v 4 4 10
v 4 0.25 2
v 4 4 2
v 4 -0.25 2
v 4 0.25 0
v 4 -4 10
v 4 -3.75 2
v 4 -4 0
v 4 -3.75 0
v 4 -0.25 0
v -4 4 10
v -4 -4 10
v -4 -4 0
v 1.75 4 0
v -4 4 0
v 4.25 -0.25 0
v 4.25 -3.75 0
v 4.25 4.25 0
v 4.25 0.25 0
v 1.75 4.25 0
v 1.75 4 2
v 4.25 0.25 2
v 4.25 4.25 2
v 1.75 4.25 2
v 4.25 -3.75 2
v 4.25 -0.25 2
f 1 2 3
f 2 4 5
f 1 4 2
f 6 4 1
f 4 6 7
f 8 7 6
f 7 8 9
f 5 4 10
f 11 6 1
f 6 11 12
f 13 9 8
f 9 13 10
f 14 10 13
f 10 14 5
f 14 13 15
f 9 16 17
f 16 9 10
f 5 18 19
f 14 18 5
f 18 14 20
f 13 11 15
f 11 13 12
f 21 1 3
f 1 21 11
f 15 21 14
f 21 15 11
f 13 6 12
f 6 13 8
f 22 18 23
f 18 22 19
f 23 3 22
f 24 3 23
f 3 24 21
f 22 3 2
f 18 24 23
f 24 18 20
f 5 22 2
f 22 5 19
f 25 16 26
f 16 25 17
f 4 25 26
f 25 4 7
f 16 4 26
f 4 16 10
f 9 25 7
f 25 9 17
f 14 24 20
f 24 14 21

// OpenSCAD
translate([0, 0, 5]) color([0,1,0,0.9]) cube([8, 8, 10], center=true);
translate([4.0, 4.0, 1]) color([1,0,0]) cube([0.5, 0.5, 2], center=true);
translate([4.0, 3.5, 1]) color([1,0,0]) cube([0.5, 0.5, 2], center=true);
translate([4.0, 3.0, 1]) color([1,0,0]) cube([0.5, 0.5, 2], center=true);
translate([4.0, 2.5, 1]) color([1,0,0]) cube([0.5, 0.5, 2], center=true);
translate([4.0, 2.0, 1]) color([1,0,0]) cube([0.5, 0.5, 2], center=true);
translate([4.0, 1.5, 1]) color([1,0,0]) cube([0.5, 0.5, 2], center=true);
translate([4.0, 1.0, 1]) color([1,0,0]) cube([0.5, 0.5, 2], center=true);
translate([4.0, 0.5, 1]) color([1,0,0]) cube([0.5, 0.5, 2], center=true);
translate([4.0, -0.5, 1]) color([1,0,0]) cube([0.5, 0.5, 2], center=true);
translate([4.0, -1.0, 1]) color([1,0,0]) cube([0.5, 0.5, 2], center=true);
translate([4.0, -1.5, 1]) color([1,0,0]) cube([0.5, 0.5, 2], center=true);
translate([4.0, -2.0, 1]) color([1,0,0]) cube([0.5, 0.5, 2], center=true);
translate([4.0, -2.5, 1]) color([1,0,0]) cube([0.5, 0.5, 2], center=true);
translate([4.0, -3.0, 1]) color([1,0,0]) cube([0.5, 0.5, 2], center=true);
translate([4.0, -3.5, 1]) color([1,0,0]) cube([0.5, 0.5, 2], center=true);
translate([3.5, 4.0, 1]) color([1,0,0]) cube([0.5, 0.5, 2], center=true);
translate([3.5, 3.5, 1]) color([1,0,0]) cube([0.5, 0.5, 2], center=true);
translate([3.5, 3.0, 1]) color([1,0,0]) cube([0.5, 0.5, 2], center=true);
translate([3.5, 2.5, 1]) color([1,0,0]) cube([0.5, 0.5, 2], center=true);
translate([3.5, 2.0, 1]) color([1,0,0]) cube([0.5, 0.5, 2], center=true);
translate([3.5, 1.5, 1]) color([1,0,0]) cube([0.5, 0.5, 2], center=true);
translate([3.5, 1.0, 1]) color([1,0,0]) cube([0.5, 0.5, 2], center=true);
translate([3.5, 0.5, 1]) color([1,0,0]) cube([0.5, 0.5, 2], center=true);
translate([3.5, -0.5, 1]) color([1,0,0]) cube([0.5, 0.5, 2], center=true);
translate([3.5, -1.0, 1]) color([1,0,0]) cube([0.5, 0.5, 2], center=true);
translate([3.5, -1.5, 1]) color([1,0,0]) cube([0.5, 0.5, 2], center=true);
translate([3.5, -2.0, 1]) color([1,0,0]) cube([0.5, 0.5, 2], center=true);
translate([3.5, -2.5, 1]) color([1,0,0]) cube([0.5, 0.5, 2], center=true);
translate([3.5, -3.0, 1]) color([1,0,0]) cube([0.5, 0.5, 2], center=true);
translate([3.5, -3.5, 1]) color([1,0,0]) cube([0.5, 0.5, 2], center=true);
translate([3.0, 4.0, 1]) color([1,0,0]) cube([0.5, 0.5, 2], center=true);
translate([3.0, 3.5, 1]) color([1,0,0]) cube([0.5, 0.5, 2], center=true);
translate([3.0, 3.0, 1]) color([1,0,0]) cube([0.5, 0.5, 2], center=true);
translate([3.0, 2.5, 1]) color([1,0,0]) cube([0.5, 0.5, 2], center=true);
translate([3.0, 2.0, 1]) color([1,0,0]) cube([0.5, 0.5, 2], center=true);
translate([3.0, 1.5, 1]) color([1,0,0]) cube([0.5, 0.5, 2], center=true);
translate([3.0, 1.0, 1]) color([1,0,0]) cube([0.5, 0.5, 2], center=true);
translate([3.0, 0.5, 1]) color([1,0,0]) cube([0.5, 0.5, 2], center=true);
translate([3.0, -0.5, 1]) color([1,0,0]) cube([0.5, 0.5, 2], center=true);
translate([3.0, -1.0, 1]) color([1,0,0]) cube([0.5, 0.5, 2], center=true);
translate([3.0, -1.5, 1]) color([1,0,0]) cube([0.5, 0.5, 2], center=true);
translate([3.0, -2.0, 1]) color([1,0,0]) cube([0.5, 0.5, 2], center=true);
translate([3.0, -2.5, 1]) color([1,0,0]) cube([0.5, 0.5, 2], center=true);
translate([3.0, -3.0, 1]) color([1,0,0]) cube([0.5, 0.5, 2], center=true);
translate([3.0, -3.5, 1]) color([1,0,0]) cube([0.5, 0.5, 2], center=true);
translate([2.5, 4.0, 1]) color([1,0,0]) cube([0.5, 0.5, 2], center=true);
translate([2.5, 3.5, 1]) color([1,0,0]) cube([0.5, 0.5, 2], center=true);
translate([2.5, 3.0, 1]) color([1,0,0]) cube([0.5, 0.5, 2], center=true);
translate([2.5, 2.5, 1]) color([1,0,0]) cube([0.5, 0.5, 2], center=true);
translate([2.5, 2.0, 1]) color([1,0,0]) cube([0.5, 0.5, 2], center=true);
translate([2.5, 1.5, 1]) color([1,0,0]) cube([0.5, 0.5, 2], center=true);
translate([2.5, 1.0, 1]) color([1,0,0]) cube([0.5, 0.5, 2], center=true);
translate([2.5, 0.5, 1]) color([1,0,0]) cube([0.5, 0.5, 2], center=true);
translate([2.5, -0.5, 1]) color([1,0,0]) cube([0.5, 0.5, 2], center=true);
translate([2.5, -1.0, 1]) color([1,0,0]) cube([0.5, 0.5, 2], center=true);
translate([2.5, -1.5, 1]) color([1,0,0]) cube([0.5, 0.5, 2], center=true);
translate([2.5, -2.0, 1]) color([1,0,0]) cube([0.5, 0.5, 2], center=true);
translate([2.5, -2.5, 1]) color([1,0,0]) cube([0.5, 0.5, 2], center=true);
translate([2.5, -3.0, 1]) color([1,0,0]) cube([0.5, 0.5, 2], center=true);
translate([2.5, -3.5, 1]) color([1,0,0]) cube([0.5, 0.5, 2], center=true);
translate([2.0, 4.0, 1]) color([1,0,0]) cube([0.5, 0.5, 2], center=true);
translate([2.0, 3.5, 1]) color([1,0,0]) cube([0.5, 0.5, 2], center=true);
translate([2.0, 3.0, 1]) color([1,0,0]) cube([0.5, 0.5, 2], center=true);
translate([2.0, 2.5, 1]) color([1,0,0]) cube([0.5, 0.5, 2], center=true);
translate([2.0, 2.0, 1]) color([1,0,0]) cube([0.5, 0.5, 2], center=true);
translate([2.0, 1.5, 1]) color([1,0,0]) cube([0.5, 0.5, 2], center=true);
translate([2.0, 1.0, 1]) color([1,0,0]) cube([0.5, 0.5, 2], center=true);
translate([2.0, 0.5, 1]) color([1,0,0]) cube([0.5, 0.5, 2], center=true);
translate([2.0, -0.5, 1]) color([1,0,0]) cube([0.5, 0.5, 2], center=true);
translate([2.0, -1.0, 1]) color([1,0,0]) cube([0.5, 0.5, 2], center=true);
translate([2.0, -1.5, 1]) color([1,0,0]) cube([0.5, 0.5, 2], center=true);
translate([2.0, -2.0, 1]) color([1,0,0]) cube([0.5, 0.5, 2], center=true);
translate([2.0, -2.5, 1]) color([1,0,0]) cube([0.5, 0.5, 2], center=true);
translate([2.0, -3.0, 1]) color([1,0,0]) cube([0.5, 0.5, 2], center=true);
translate([2.0, -3.5, 1]) color([1,0,0]) cube([0.5, 0.5, 2], center=true);
